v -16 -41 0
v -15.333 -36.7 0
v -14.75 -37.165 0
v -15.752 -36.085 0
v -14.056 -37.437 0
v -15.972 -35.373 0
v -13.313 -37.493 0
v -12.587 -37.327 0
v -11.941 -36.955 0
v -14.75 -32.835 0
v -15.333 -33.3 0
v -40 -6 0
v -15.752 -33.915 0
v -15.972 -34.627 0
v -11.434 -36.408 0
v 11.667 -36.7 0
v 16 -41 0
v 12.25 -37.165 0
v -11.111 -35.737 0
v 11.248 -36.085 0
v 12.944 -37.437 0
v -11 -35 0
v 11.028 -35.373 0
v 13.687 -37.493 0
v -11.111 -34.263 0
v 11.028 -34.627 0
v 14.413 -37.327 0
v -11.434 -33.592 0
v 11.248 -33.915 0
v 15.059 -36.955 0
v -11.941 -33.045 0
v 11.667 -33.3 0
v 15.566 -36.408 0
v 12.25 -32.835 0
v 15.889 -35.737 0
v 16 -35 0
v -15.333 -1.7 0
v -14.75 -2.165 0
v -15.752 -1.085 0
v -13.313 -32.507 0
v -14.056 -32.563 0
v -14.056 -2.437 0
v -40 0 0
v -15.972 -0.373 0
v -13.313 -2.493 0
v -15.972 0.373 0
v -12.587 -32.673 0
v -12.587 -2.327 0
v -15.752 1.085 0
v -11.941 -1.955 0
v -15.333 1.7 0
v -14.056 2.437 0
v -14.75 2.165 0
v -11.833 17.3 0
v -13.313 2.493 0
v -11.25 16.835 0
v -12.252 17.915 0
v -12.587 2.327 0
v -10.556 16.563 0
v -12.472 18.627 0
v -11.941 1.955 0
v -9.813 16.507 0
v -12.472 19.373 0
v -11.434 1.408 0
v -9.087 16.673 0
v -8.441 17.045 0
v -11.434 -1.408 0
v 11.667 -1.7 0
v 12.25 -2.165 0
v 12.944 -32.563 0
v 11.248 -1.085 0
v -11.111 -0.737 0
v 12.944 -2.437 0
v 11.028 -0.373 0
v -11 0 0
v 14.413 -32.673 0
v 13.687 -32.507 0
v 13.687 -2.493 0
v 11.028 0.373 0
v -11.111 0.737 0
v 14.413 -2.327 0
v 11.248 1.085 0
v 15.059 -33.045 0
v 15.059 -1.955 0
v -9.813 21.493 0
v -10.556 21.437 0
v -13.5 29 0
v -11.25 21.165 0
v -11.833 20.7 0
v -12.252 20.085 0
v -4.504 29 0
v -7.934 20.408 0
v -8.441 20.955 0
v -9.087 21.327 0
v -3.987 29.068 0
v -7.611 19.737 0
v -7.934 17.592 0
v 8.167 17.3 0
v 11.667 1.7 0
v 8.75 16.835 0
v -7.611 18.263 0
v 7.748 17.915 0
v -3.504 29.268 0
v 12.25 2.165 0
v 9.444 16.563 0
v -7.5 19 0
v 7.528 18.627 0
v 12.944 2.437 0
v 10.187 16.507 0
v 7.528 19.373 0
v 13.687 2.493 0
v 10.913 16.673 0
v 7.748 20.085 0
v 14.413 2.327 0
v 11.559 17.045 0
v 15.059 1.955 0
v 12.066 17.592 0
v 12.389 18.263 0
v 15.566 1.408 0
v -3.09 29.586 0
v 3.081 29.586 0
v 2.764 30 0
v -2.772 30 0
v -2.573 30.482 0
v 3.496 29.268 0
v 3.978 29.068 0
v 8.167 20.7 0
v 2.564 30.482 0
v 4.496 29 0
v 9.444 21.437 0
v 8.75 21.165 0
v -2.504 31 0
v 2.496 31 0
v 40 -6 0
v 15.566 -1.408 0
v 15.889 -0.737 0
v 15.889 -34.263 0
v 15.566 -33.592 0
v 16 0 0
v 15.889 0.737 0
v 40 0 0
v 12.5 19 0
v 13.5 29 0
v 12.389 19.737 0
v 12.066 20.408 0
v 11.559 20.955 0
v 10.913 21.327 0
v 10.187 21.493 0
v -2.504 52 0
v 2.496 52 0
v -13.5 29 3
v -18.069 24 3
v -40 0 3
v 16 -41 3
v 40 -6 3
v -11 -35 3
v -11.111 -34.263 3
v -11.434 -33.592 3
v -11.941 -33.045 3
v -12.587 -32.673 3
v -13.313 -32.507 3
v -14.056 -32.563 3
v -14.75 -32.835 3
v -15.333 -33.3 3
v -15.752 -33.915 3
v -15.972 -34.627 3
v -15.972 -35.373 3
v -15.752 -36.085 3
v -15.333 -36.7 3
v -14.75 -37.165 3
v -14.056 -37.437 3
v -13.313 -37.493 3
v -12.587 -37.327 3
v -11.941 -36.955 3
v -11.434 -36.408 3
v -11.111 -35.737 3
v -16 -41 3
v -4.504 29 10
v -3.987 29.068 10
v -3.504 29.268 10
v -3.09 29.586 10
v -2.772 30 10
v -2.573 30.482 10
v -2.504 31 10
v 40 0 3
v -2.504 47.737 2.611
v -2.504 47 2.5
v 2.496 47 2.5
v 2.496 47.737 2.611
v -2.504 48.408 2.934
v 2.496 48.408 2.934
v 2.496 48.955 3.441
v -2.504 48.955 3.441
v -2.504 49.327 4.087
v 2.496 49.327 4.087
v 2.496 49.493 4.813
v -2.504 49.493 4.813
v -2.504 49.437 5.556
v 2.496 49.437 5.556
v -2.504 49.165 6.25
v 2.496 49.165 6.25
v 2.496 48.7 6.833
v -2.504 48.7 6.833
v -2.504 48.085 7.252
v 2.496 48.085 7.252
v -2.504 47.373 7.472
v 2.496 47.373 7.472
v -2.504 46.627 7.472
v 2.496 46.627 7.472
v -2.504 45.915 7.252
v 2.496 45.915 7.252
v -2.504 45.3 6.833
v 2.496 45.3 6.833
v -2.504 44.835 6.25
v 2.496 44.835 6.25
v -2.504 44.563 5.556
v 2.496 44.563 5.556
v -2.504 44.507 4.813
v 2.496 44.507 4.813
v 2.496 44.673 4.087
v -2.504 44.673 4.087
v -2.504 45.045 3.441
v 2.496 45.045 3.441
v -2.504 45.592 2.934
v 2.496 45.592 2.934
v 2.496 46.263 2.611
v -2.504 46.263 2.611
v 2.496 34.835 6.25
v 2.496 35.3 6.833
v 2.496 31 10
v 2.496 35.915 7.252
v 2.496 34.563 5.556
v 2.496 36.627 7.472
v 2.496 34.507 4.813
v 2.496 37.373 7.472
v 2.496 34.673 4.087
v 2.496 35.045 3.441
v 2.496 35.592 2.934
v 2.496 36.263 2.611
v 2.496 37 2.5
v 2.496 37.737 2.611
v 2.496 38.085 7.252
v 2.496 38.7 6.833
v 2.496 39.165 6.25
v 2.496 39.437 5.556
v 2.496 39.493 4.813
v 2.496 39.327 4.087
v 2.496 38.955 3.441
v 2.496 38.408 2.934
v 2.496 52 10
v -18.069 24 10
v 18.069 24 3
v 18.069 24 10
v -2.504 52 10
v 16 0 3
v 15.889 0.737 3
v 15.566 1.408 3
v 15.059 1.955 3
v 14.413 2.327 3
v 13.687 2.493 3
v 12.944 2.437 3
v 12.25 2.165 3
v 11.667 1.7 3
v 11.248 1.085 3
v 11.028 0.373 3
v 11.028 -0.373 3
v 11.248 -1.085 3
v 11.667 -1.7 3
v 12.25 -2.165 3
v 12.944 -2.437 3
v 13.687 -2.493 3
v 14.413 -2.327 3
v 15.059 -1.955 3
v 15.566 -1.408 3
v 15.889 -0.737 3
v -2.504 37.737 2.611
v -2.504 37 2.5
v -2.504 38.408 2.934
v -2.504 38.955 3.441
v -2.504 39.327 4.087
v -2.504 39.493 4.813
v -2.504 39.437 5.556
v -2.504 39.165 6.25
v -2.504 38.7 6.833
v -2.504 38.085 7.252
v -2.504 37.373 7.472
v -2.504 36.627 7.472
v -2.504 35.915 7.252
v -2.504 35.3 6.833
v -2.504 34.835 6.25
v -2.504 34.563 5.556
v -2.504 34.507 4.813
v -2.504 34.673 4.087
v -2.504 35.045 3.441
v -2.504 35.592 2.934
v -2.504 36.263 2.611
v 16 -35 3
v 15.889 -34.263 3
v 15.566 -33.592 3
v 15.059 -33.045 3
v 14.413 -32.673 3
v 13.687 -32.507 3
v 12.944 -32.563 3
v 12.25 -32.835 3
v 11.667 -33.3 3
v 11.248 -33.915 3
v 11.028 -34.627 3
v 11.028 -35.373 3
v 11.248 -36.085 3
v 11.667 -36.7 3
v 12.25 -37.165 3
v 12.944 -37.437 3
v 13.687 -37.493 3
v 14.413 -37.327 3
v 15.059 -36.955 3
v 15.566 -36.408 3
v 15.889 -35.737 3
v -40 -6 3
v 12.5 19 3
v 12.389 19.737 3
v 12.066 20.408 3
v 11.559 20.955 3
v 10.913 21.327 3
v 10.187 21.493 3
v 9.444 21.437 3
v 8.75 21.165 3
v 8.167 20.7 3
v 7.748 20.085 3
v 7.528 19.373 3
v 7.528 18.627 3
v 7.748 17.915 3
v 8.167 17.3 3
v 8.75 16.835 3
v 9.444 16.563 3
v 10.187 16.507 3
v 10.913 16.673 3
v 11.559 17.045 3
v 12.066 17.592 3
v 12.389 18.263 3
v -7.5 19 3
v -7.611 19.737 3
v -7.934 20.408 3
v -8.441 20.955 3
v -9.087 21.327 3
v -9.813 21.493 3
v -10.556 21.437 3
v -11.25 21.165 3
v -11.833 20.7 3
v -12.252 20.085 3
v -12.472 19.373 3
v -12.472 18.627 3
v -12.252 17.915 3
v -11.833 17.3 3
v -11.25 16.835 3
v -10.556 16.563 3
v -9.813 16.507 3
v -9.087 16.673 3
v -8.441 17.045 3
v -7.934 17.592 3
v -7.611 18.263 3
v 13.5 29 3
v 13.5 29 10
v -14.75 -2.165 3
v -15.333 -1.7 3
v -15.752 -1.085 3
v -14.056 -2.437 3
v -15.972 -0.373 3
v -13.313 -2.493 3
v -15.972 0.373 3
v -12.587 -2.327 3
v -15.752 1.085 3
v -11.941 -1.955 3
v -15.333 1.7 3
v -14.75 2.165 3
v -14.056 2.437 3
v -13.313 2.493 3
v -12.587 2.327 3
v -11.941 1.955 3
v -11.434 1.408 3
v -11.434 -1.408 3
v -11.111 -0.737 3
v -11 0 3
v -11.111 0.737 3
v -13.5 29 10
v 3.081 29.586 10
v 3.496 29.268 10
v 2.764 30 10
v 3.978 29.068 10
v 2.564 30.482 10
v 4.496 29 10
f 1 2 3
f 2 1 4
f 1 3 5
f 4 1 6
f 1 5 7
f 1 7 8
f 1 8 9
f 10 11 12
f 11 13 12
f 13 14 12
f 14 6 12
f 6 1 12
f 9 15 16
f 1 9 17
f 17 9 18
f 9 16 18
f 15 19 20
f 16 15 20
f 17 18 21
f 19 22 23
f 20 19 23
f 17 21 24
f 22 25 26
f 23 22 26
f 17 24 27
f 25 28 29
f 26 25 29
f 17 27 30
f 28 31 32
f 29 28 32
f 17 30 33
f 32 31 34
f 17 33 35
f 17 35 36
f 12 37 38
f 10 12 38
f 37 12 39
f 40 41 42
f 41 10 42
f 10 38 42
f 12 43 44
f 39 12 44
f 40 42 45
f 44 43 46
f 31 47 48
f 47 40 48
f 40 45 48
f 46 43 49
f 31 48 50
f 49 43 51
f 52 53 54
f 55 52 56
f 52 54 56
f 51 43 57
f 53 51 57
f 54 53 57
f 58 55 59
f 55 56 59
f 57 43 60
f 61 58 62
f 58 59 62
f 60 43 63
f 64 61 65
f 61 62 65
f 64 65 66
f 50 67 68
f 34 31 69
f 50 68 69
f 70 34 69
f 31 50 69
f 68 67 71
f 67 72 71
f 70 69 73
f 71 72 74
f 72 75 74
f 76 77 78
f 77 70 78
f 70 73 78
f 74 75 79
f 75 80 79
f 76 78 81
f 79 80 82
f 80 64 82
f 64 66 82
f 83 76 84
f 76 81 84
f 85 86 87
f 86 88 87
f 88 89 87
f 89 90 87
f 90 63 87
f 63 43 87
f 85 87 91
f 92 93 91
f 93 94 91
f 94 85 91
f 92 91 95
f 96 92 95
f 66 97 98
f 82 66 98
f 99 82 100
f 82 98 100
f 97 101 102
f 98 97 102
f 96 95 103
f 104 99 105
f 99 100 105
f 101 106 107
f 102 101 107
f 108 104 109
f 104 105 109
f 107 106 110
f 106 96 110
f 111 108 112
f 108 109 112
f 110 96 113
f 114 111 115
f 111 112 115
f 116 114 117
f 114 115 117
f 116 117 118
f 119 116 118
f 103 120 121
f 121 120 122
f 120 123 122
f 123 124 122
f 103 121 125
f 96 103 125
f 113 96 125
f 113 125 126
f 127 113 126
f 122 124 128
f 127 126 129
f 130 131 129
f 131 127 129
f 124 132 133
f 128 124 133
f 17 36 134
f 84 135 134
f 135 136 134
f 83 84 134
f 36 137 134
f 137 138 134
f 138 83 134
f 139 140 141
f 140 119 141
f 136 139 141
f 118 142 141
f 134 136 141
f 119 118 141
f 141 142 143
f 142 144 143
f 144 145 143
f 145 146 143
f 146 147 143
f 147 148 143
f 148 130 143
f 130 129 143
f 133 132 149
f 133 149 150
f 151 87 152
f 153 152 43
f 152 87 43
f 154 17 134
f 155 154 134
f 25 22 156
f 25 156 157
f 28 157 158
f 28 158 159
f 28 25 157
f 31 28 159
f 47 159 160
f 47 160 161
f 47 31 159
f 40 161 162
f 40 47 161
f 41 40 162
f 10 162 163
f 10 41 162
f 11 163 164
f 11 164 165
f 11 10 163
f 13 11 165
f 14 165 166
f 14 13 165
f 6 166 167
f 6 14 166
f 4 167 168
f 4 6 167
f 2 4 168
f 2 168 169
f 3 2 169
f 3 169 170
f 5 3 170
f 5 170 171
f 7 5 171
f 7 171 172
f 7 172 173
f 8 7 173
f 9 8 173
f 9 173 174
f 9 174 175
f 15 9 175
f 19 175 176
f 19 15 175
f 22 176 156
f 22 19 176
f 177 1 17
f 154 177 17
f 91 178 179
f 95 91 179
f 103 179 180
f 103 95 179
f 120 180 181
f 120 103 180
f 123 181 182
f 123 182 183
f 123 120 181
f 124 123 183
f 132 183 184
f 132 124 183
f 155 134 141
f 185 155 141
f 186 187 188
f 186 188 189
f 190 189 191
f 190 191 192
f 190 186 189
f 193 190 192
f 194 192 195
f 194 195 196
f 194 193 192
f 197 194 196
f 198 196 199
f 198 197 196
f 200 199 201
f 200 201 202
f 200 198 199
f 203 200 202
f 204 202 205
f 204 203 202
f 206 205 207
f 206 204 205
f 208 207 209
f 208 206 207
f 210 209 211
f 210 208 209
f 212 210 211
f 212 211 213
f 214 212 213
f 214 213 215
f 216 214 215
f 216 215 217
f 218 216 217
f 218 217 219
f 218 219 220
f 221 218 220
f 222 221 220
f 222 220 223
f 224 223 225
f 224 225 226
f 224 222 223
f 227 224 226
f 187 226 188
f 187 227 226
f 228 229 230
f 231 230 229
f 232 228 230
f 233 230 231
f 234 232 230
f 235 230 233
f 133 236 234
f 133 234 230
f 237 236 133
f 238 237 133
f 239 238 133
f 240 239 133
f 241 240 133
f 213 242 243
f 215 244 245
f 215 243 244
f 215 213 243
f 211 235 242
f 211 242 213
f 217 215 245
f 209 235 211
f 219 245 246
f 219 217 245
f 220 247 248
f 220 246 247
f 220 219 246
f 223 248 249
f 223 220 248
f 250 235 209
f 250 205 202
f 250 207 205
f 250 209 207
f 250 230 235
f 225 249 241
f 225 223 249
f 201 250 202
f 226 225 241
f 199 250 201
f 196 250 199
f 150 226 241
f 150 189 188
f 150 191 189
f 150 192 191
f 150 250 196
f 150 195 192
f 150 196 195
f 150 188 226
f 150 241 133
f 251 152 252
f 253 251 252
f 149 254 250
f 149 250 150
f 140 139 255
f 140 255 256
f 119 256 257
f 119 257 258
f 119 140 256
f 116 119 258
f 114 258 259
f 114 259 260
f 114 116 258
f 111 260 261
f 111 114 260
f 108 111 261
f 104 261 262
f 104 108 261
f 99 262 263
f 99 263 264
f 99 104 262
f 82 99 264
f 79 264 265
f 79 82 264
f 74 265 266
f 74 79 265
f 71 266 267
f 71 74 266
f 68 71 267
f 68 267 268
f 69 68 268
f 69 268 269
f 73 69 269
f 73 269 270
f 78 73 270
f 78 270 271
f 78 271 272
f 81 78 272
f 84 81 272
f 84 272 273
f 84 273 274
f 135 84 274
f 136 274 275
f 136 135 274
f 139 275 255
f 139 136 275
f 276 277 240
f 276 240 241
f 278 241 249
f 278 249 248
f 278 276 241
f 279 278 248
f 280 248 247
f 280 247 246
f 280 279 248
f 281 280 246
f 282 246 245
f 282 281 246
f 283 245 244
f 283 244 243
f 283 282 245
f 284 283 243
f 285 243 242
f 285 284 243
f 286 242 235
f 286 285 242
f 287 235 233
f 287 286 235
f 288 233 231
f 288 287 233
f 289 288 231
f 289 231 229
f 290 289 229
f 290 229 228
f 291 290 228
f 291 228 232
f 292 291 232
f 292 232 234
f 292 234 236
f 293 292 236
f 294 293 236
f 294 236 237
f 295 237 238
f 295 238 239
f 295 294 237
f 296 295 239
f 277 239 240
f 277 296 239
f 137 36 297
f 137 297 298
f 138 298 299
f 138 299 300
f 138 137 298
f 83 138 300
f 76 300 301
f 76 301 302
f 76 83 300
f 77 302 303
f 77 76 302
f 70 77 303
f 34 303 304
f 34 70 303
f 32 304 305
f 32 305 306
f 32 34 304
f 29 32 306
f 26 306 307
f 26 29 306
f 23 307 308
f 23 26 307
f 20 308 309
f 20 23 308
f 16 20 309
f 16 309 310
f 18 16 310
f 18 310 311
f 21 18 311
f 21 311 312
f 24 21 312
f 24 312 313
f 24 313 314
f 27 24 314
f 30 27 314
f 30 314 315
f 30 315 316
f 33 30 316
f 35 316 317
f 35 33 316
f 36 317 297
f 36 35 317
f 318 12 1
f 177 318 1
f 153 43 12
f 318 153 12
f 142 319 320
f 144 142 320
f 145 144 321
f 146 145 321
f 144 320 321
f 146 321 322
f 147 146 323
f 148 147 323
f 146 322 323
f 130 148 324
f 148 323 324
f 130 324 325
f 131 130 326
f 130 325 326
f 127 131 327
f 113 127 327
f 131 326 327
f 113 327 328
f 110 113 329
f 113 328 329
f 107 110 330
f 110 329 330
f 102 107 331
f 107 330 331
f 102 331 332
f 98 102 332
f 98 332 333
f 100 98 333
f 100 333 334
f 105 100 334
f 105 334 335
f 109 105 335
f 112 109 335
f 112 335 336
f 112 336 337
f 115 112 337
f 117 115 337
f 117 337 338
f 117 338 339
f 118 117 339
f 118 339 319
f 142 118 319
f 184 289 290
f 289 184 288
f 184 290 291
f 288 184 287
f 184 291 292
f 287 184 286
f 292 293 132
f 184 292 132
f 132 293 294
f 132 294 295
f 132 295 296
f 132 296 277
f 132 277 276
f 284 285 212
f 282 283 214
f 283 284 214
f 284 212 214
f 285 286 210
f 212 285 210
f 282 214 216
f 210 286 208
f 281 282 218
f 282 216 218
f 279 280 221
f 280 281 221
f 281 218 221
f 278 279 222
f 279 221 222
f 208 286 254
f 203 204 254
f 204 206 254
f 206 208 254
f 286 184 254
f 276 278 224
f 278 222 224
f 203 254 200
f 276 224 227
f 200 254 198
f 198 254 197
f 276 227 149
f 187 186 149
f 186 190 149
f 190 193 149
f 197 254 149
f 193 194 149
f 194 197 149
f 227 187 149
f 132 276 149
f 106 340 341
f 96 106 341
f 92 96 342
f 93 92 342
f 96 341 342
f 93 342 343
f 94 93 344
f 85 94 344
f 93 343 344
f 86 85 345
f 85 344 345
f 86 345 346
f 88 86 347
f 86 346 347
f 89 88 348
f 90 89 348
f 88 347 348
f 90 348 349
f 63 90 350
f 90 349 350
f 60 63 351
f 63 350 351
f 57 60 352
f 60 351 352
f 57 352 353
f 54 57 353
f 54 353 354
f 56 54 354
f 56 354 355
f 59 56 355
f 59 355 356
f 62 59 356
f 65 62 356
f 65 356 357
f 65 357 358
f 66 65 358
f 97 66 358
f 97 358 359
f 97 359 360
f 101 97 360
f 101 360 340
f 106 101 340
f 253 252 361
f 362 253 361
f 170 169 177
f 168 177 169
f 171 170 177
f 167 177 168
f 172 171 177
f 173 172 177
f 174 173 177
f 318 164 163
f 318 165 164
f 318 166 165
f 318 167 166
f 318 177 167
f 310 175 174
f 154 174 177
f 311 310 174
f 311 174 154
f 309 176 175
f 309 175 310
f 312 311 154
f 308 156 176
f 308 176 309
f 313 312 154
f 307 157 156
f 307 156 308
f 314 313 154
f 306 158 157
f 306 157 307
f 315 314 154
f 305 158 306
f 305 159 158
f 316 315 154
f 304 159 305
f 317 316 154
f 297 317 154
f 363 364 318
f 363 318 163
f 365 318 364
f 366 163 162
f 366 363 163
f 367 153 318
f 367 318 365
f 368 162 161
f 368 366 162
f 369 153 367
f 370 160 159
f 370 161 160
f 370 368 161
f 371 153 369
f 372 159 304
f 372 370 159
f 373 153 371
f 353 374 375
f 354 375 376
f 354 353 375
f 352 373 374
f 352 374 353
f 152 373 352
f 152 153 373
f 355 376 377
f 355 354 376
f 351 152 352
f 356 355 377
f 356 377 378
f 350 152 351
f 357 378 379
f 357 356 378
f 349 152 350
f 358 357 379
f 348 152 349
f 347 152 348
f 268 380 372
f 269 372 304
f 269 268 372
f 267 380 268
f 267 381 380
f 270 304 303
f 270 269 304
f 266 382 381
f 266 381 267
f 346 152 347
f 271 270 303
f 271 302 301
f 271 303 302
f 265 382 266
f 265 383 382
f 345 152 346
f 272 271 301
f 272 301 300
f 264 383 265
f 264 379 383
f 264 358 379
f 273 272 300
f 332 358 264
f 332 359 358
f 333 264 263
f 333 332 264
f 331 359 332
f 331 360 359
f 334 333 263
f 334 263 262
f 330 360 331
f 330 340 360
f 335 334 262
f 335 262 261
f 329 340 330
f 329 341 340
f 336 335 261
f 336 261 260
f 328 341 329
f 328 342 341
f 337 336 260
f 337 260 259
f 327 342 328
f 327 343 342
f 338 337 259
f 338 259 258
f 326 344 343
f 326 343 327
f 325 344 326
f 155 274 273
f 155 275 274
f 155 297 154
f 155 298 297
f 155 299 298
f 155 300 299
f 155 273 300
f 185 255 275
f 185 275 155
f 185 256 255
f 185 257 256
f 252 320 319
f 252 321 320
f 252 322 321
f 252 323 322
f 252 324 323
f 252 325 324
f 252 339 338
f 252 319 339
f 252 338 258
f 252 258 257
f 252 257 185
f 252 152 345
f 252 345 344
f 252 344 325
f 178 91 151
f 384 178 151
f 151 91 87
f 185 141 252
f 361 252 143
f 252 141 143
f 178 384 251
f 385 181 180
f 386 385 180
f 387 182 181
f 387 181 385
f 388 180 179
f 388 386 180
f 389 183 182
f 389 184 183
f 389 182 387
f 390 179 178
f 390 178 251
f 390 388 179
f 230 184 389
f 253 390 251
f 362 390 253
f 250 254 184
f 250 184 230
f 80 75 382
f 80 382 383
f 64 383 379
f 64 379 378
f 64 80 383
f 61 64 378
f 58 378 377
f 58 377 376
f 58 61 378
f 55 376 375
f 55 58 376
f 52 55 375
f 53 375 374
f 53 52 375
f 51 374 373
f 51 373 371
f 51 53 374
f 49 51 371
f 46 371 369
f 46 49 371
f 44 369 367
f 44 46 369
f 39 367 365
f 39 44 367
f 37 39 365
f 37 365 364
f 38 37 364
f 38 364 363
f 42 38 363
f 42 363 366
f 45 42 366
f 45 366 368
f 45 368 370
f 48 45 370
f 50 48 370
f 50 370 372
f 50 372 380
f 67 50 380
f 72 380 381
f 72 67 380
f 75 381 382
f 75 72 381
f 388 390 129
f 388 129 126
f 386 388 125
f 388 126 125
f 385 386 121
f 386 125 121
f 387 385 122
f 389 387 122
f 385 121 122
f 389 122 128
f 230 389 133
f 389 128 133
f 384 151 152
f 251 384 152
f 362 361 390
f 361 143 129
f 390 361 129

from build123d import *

# Parameters (mm, degrees)
SKETCH2_R                = 2.5
BOSS_EXTRUDE1_DEPTH      = 3
BOSS_EXTRUDE2_DEPTH      = 7
BOSS_EXTRUDE4_DEPTH      = 2.8
BOSS_EXTRUDE4_DEPTH_BACK = 2.2
SKETCH7_W                = 10
SKETCH7_H                = 23
SKETCH7_R                = 2.5
SKETCH9_R                = 2.5
CUT_EXTRUDE1_DEPTH       = 10
FILLET5_R                = 2


with BuildPart() as part:
    # Sketch2 → Boss-Extrude1 (new body)
    with BuildSketch(Plane.XY):
        Polygon((16, -41), (40, -6), (40, 0), (13.5, 29), (-13.5, 29), (-40, 0), (-40, -6), (-16, -41), align=None)
        with Locations((-13.5, 0)):
            Circle(SKETCH2_R, mode=Mode.SUBTRACT)
        with Locations((13.5, 0)):
            Circle(SKETCH2_R, mode=Mode.SUBTRACT)
        with Locations((13.5, -35)):
            Circle(SKETCH2_R, mode=Mode.SUBTRACT)
        with Locations((-13.5, -35)):
            Circle(SKETCH2_R, mode=Mode.SUBTRACT)
    extrude(amount=BOSS_EXTRUDE1_DEPTH)

    # Sketch4 → Boss-Extrude2 (add)
    with BuildSketch(Plane.XY.offset(3)):
        Polygon((-13.5, 29), (-18.068965517, 24), (18.068965517, 24), (13.5, 29), align=None)
    extrude(amount=BOSS_EXTRUDE2_DEPTH)

    # Sketch7 → Boss-Extrude4 (add, two sides: drawn at the far end of the back side and taken through both)
    with BuildSketch(Plane(origin=(-0.30437935, -56.168103165, -48.676228962), x_dir=(0, 0, -1), z_dir=(1, 0, 0)).offset(-BOSS_EXTRUDE4_DEPTH_BACK)):
        with Locations((-53.676228962, 96.668103165)):
            Rectangle(SKETCH7_W, SKETCH7_H)
        with Locations((-53.676228962, 103.168103165)):
            Circle(SKETCH7_R, mode=Mode.SUBTRACT)
        with Locations((-53.676228962, 93.168103165)):
            Circle(SKETCH7_R, mode=Mode.SUBTRACT)
    extrude(amount=BOSS_EXTRUDE4_DEPTH + BOSS_EXTRUDE4_DEPTH_BACK)

    # Sketch9 → Cut-Extrude1 (cut)
    with BuildSketch(Plane.XY.offset(3)):
        with Locations((-10, 19)):
            Circle(SKETCH9_R)
        with Locations((10, 19)):
            Circle(SKETCH9_R)
    extrude(amount=-CUT_EXTRUDE1_DEPTH, mode=Mode.SUBTRACT)

    # Fillet5
    fillet5_edges = [part.edges().sort_by_distance(p)[0] for p in [
        (-2.50437935, 29, 5),
        (2.49562065, 29, 5),
    ]]
    fillet(fillet5_edges, radius=FILLET5_R)


solid = part.part
